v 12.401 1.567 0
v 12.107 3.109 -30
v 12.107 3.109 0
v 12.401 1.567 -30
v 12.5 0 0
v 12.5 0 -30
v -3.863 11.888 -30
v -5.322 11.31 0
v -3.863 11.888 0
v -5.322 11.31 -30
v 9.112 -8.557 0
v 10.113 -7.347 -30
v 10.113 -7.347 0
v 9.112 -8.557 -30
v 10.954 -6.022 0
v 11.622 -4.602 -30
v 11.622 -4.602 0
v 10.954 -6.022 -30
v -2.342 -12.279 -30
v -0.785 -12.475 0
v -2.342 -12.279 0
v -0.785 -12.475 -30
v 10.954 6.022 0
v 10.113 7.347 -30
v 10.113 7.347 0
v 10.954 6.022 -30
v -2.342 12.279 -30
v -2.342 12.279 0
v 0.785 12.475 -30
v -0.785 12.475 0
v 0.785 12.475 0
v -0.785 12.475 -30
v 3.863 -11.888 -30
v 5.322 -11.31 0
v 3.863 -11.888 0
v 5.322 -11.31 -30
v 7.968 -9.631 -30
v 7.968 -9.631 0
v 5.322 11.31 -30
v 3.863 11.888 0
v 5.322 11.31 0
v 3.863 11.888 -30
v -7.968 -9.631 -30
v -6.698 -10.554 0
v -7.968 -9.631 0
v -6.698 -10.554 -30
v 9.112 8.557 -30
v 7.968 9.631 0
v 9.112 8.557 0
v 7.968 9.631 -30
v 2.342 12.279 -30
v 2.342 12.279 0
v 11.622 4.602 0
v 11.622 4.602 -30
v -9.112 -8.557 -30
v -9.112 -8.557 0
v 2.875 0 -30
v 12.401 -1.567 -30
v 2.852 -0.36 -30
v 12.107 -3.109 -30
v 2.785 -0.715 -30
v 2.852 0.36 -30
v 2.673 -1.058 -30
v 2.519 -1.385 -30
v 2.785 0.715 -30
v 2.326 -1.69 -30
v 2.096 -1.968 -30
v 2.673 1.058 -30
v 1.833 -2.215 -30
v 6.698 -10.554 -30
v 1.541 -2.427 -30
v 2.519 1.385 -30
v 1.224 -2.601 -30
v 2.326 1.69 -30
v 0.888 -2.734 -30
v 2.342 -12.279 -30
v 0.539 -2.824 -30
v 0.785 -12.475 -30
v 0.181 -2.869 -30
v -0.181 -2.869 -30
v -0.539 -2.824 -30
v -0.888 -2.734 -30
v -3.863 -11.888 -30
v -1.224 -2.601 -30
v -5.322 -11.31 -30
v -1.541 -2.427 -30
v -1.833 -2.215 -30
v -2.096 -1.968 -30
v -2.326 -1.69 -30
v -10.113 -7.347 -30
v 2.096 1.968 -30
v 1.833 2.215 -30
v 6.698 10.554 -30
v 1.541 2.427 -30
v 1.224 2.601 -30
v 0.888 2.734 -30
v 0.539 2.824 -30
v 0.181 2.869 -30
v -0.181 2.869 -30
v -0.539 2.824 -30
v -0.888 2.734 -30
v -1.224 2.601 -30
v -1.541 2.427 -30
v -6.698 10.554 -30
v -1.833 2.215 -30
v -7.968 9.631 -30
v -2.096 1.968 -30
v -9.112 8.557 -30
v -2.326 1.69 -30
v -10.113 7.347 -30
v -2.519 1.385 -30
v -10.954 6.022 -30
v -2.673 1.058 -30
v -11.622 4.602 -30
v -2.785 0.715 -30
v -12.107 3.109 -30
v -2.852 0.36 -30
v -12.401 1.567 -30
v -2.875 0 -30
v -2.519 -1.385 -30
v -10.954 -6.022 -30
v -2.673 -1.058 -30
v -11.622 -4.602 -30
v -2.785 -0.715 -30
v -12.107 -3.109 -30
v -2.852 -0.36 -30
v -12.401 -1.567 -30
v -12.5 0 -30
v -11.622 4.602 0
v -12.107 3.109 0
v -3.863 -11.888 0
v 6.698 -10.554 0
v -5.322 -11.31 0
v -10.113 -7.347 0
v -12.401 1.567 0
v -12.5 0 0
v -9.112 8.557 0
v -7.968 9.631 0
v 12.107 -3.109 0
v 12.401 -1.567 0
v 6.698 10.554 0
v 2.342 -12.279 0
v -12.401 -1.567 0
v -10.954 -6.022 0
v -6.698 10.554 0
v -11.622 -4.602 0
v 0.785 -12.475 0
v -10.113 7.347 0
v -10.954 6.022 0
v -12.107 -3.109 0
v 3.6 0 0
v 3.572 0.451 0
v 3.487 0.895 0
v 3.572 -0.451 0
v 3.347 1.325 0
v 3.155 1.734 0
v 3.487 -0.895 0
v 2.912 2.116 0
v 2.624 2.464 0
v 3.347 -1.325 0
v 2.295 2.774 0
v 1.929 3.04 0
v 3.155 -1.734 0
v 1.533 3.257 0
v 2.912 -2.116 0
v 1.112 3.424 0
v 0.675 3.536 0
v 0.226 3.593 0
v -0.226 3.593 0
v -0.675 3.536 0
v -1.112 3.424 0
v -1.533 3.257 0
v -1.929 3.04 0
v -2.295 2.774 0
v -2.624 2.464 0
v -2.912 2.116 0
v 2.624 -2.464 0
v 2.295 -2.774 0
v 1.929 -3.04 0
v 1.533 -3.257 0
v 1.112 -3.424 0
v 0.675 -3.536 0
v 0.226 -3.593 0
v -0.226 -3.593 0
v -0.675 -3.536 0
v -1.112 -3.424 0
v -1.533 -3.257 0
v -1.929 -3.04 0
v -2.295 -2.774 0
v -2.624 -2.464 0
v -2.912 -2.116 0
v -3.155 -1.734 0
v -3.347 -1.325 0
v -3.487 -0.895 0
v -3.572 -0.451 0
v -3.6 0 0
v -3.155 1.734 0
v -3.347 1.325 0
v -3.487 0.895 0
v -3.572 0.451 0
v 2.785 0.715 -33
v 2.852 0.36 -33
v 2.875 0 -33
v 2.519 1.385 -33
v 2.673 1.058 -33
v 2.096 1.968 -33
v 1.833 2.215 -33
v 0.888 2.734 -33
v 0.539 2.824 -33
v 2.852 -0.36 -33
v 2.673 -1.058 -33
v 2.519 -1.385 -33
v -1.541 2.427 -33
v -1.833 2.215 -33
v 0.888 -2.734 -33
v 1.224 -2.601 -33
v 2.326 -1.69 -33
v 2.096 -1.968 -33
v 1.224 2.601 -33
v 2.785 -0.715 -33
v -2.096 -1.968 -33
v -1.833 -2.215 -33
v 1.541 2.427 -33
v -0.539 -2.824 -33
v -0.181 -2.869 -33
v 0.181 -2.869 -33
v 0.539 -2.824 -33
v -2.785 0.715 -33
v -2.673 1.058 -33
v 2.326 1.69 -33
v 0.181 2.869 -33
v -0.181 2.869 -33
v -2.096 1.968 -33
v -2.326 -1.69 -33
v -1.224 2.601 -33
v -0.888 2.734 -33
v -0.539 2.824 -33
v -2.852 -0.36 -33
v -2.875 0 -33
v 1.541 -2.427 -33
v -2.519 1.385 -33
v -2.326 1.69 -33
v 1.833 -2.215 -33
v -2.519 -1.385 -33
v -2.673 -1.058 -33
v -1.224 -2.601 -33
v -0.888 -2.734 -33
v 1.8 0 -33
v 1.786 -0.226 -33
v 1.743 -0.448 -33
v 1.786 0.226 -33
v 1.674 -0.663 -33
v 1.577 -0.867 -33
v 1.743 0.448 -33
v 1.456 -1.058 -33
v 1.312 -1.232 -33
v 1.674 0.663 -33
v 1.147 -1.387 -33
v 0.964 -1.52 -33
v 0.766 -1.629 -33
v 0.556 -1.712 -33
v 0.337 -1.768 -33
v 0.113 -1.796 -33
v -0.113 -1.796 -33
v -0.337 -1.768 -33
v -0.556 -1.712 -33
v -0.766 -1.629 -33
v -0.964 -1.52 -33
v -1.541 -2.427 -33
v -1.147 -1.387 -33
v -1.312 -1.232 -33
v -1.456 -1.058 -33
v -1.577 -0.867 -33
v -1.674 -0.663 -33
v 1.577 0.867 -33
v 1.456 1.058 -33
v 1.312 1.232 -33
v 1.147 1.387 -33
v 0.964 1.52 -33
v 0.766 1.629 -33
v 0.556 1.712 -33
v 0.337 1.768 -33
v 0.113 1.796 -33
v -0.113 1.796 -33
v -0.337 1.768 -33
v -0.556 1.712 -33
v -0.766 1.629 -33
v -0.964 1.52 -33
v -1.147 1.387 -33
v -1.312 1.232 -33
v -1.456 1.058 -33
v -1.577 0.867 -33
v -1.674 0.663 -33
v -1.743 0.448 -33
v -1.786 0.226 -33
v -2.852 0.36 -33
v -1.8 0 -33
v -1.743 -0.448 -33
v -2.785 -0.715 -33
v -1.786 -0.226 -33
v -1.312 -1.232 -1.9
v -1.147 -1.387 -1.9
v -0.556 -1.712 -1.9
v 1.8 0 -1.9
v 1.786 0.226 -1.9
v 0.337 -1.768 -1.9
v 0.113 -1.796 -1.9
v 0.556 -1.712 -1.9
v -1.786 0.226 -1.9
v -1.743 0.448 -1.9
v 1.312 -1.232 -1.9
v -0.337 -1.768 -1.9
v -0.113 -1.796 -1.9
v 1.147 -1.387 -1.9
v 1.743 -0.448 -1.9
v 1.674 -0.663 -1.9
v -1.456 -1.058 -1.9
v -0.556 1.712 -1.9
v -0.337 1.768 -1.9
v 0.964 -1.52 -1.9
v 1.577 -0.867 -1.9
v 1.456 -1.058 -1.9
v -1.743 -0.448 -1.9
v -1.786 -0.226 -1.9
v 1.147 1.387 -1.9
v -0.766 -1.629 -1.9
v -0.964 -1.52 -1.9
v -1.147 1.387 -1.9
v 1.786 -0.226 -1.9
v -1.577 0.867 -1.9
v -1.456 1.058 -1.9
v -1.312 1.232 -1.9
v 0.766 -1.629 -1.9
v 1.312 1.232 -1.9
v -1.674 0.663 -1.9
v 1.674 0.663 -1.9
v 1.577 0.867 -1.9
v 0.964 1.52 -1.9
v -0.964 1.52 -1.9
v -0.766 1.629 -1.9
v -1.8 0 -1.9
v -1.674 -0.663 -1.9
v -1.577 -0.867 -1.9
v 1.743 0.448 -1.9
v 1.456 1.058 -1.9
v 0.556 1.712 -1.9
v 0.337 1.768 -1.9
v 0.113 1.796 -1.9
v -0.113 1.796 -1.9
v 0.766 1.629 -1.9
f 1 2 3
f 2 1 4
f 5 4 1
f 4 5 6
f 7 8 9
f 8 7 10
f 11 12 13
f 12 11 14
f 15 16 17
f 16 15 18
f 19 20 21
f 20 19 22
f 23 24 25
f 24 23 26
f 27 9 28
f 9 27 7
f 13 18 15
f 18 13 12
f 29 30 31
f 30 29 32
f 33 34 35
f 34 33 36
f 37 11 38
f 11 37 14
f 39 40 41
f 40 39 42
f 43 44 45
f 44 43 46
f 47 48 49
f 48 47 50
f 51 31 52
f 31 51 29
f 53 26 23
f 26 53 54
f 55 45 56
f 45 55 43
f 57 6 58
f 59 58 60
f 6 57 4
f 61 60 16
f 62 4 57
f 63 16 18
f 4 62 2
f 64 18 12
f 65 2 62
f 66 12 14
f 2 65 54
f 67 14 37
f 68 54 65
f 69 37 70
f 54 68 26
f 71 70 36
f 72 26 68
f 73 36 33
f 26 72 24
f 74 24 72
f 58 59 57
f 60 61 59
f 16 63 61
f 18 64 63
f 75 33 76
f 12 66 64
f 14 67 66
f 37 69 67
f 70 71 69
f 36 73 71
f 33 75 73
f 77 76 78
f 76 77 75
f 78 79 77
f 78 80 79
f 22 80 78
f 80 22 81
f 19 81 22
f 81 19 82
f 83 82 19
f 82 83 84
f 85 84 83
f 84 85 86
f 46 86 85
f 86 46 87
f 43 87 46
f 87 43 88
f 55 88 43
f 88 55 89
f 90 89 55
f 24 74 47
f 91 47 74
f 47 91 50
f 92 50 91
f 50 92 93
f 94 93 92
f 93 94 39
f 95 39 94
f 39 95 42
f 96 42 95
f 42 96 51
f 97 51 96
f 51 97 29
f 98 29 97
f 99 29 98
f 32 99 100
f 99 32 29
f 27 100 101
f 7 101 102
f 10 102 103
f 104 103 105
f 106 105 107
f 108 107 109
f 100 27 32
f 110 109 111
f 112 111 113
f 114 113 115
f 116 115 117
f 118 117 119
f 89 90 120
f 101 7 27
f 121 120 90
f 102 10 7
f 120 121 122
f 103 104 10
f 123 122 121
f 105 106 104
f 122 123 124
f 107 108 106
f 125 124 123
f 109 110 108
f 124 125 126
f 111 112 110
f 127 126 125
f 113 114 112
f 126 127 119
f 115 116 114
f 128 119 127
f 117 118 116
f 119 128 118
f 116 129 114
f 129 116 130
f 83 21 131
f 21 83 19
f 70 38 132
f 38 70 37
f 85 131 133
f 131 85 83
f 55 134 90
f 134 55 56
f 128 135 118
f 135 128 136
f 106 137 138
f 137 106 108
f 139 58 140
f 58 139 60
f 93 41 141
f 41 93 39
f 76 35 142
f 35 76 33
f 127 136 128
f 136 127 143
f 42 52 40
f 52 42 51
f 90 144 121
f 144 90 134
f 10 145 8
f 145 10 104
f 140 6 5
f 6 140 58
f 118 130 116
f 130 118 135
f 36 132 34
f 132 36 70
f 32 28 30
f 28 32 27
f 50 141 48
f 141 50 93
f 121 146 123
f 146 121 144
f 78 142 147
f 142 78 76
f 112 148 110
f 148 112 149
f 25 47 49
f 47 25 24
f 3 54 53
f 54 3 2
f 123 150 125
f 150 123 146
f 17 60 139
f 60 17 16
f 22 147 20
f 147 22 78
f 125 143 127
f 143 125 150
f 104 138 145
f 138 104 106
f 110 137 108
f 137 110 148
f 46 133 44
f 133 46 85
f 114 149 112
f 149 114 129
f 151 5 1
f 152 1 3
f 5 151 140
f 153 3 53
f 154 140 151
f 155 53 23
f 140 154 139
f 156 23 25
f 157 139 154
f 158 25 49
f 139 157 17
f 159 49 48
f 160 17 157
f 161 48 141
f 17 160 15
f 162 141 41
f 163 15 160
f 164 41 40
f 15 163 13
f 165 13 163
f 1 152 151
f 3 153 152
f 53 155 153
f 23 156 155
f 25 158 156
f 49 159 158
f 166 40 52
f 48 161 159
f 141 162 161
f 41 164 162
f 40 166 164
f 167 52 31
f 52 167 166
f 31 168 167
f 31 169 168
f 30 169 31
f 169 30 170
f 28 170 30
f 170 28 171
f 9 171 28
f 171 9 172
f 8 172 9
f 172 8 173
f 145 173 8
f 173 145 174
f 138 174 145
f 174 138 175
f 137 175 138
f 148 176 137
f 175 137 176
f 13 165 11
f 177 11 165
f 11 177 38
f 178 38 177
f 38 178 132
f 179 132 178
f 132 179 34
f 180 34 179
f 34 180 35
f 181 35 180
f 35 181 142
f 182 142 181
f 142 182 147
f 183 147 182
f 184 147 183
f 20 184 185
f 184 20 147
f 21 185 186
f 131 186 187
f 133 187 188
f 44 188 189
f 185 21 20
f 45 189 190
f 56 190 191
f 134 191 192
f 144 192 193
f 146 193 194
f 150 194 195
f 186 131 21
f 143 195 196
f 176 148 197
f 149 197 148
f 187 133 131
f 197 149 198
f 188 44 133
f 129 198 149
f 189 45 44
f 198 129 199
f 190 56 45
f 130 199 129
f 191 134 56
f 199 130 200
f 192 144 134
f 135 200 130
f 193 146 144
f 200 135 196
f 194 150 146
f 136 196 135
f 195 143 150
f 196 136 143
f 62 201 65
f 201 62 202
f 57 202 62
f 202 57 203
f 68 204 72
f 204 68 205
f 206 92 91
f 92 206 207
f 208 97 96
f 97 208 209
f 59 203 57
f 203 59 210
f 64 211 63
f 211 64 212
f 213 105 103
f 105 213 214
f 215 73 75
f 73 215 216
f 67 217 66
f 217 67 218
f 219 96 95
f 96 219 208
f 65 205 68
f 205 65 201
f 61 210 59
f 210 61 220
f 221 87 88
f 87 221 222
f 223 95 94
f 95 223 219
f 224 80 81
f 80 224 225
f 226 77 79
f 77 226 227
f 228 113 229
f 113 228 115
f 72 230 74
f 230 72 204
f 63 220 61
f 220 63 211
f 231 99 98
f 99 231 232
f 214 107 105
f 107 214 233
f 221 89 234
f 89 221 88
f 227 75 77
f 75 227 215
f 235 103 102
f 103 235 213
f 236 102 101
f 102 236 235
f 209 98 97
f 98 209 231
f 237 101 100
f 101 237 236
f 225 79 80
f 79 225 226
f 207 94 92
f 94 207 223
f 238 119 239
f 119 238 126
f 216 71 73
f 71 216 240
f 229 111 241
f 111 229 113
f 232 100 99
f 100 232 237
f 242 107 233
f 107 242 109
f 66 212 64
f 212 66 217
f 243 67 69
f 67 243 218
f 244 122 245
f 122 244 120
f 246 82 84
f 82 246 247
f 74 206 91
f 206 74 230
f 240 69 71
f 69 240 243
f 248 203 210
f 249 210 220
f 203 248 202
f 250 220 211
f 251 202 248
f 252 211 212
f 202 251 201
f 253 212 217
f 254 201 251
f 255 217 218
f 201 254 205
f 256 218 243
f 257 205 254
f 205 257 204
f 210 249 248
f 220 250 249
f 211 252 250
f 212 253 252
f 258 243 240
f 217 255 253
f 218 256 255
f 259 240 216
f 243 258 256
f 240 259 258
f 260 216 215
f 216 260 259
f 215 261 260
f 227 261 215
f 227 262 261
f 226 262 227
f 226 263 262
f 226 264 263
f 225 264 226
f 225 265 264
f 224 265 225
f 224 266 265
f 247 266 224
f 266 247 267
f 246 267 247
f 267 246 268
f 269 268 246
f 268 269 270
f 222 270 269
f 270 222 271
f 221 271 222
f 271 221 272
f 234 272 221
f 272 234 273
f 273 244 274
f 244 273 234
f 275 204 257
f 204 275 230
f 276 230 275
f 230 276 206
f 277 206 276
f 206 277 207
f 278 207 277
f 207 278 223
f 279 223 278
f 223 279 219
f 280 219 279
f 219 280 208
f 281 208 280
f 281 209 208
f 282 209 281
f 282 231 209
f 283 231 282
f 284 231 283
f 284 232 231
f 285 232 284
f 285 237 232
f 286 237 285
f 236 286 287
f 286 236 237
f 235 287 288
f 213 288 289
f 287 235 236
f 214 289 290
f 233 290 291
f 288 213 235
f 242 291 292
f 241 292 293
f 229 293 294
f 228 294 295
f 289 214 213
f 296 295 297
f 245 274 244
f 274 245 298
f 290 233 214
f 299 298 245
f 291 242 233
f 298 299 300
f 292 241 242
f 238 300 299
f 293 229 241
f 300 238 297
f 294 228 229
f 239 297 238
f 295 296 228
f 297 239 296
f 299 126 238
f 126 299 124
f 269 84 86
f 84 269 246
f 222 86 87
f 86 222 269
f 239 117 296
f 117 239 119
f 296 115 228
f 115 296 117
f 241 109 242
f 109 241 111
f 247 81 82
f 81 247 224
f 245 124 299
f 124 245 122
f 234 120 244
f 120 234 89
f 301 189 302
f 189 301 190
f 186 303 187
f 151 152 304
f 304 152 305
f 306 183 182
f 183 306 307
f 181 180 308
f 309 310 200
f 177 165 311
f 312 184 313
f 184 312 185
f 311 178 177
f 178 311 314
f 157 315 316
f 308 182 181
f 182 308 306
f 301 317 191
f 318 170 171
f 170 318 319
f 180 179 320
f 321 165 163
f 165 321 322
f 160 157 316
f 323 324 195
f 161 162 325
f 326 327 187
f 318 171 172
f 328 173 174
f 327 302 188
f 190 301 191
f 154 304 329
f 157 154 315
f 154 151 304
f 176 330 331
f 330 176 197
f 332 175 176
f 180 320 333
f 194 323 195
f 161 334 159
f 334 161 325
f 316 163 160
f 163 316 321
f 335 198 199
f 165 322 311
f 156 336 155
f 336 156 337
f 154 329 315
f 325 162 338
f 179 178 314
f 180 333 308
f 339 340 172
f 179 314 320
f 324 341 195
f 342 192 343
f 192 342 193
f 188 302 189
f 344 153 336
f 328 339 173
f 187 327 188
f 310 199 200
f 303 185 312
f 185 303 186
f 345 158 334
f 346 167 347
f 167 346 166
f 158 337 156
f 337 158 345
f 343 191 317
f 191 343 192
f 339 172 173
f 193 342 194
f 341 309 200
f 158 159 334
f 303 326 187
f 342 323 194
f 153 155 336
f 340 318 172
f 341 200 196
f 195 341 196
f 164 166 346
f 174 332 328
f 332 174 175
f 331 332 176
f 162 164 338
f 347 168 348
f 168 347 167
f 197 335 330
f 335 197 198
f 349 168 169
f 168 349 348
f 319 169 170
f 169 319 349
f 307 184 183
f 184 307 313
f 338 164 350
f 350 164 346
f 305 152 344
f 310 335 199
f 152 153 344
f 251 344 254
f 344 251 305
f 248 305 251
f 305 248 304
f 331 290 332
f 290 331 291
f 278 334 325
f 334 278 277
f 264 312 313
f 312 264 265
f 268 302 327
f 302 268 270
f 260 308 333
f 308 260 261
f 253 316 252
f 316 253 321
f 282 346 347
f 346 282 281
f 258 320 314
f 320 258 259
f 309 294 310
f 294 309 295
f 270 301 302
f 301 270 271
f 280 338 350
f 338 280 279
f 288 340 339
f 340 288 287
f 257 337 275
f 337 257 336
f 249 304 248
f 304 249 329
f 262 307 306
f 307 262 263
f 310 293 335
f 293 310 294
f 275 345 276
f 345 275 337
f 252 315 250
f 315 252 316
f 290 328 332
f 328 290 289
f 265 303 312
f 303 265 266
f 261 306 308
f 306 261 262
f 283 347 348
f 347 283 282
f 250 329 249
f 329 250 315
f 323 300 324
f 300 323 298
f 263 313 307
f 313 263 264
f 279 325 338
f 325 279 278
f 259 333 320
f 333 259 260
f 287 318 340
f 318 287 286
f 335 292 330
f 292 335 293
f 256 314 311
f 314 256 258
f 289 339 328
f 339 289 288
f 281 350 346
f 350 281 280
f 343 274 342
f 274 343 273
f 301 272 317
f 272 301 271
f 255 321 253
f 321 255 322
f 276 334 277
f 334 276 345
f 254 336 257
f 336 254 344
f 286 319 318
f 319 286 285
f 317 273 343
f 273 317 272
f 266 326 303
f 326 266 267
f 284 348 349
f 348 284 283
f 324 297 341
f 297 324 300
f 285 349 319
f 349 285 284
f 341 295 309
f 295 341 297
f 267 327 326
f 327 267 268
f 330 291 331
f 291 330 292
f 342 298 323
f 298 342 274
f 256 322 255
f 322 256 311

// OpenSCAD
$fn = 50;

difference() {
	union() {
		translate(v = [0, 0, -30.0]) {
			cylinder(h = 30, r = 12.5);
		}
		#translate(v = [0, 0, -33.0]) {
			cylinder(h = 33, r = 2.875);
		}
	}
	union() {
		translate(v = [0, 0, 0]) {
			rotate(a = [0, 0, 0]) {
				difference() {
					union() {
						translate(v = [0, 0, -33.0]) {
							cylinder(h = 33, r = 1.5);
						}
						translate(v = [0, 0, -1.9]) {
							cylinder(h = 1.9, r1 = 1.8, r2 = 3.6);
						}
						translate(v = [0, 0, -33.0]) {
							cylinder(h = 33, r = 1.8);
						}
						translate(v = [0, 0, -33.0]) {
							cylinder(h = 33, r = 1.5);
						}
					}
					union();
				}
			}
		}
	}
}
